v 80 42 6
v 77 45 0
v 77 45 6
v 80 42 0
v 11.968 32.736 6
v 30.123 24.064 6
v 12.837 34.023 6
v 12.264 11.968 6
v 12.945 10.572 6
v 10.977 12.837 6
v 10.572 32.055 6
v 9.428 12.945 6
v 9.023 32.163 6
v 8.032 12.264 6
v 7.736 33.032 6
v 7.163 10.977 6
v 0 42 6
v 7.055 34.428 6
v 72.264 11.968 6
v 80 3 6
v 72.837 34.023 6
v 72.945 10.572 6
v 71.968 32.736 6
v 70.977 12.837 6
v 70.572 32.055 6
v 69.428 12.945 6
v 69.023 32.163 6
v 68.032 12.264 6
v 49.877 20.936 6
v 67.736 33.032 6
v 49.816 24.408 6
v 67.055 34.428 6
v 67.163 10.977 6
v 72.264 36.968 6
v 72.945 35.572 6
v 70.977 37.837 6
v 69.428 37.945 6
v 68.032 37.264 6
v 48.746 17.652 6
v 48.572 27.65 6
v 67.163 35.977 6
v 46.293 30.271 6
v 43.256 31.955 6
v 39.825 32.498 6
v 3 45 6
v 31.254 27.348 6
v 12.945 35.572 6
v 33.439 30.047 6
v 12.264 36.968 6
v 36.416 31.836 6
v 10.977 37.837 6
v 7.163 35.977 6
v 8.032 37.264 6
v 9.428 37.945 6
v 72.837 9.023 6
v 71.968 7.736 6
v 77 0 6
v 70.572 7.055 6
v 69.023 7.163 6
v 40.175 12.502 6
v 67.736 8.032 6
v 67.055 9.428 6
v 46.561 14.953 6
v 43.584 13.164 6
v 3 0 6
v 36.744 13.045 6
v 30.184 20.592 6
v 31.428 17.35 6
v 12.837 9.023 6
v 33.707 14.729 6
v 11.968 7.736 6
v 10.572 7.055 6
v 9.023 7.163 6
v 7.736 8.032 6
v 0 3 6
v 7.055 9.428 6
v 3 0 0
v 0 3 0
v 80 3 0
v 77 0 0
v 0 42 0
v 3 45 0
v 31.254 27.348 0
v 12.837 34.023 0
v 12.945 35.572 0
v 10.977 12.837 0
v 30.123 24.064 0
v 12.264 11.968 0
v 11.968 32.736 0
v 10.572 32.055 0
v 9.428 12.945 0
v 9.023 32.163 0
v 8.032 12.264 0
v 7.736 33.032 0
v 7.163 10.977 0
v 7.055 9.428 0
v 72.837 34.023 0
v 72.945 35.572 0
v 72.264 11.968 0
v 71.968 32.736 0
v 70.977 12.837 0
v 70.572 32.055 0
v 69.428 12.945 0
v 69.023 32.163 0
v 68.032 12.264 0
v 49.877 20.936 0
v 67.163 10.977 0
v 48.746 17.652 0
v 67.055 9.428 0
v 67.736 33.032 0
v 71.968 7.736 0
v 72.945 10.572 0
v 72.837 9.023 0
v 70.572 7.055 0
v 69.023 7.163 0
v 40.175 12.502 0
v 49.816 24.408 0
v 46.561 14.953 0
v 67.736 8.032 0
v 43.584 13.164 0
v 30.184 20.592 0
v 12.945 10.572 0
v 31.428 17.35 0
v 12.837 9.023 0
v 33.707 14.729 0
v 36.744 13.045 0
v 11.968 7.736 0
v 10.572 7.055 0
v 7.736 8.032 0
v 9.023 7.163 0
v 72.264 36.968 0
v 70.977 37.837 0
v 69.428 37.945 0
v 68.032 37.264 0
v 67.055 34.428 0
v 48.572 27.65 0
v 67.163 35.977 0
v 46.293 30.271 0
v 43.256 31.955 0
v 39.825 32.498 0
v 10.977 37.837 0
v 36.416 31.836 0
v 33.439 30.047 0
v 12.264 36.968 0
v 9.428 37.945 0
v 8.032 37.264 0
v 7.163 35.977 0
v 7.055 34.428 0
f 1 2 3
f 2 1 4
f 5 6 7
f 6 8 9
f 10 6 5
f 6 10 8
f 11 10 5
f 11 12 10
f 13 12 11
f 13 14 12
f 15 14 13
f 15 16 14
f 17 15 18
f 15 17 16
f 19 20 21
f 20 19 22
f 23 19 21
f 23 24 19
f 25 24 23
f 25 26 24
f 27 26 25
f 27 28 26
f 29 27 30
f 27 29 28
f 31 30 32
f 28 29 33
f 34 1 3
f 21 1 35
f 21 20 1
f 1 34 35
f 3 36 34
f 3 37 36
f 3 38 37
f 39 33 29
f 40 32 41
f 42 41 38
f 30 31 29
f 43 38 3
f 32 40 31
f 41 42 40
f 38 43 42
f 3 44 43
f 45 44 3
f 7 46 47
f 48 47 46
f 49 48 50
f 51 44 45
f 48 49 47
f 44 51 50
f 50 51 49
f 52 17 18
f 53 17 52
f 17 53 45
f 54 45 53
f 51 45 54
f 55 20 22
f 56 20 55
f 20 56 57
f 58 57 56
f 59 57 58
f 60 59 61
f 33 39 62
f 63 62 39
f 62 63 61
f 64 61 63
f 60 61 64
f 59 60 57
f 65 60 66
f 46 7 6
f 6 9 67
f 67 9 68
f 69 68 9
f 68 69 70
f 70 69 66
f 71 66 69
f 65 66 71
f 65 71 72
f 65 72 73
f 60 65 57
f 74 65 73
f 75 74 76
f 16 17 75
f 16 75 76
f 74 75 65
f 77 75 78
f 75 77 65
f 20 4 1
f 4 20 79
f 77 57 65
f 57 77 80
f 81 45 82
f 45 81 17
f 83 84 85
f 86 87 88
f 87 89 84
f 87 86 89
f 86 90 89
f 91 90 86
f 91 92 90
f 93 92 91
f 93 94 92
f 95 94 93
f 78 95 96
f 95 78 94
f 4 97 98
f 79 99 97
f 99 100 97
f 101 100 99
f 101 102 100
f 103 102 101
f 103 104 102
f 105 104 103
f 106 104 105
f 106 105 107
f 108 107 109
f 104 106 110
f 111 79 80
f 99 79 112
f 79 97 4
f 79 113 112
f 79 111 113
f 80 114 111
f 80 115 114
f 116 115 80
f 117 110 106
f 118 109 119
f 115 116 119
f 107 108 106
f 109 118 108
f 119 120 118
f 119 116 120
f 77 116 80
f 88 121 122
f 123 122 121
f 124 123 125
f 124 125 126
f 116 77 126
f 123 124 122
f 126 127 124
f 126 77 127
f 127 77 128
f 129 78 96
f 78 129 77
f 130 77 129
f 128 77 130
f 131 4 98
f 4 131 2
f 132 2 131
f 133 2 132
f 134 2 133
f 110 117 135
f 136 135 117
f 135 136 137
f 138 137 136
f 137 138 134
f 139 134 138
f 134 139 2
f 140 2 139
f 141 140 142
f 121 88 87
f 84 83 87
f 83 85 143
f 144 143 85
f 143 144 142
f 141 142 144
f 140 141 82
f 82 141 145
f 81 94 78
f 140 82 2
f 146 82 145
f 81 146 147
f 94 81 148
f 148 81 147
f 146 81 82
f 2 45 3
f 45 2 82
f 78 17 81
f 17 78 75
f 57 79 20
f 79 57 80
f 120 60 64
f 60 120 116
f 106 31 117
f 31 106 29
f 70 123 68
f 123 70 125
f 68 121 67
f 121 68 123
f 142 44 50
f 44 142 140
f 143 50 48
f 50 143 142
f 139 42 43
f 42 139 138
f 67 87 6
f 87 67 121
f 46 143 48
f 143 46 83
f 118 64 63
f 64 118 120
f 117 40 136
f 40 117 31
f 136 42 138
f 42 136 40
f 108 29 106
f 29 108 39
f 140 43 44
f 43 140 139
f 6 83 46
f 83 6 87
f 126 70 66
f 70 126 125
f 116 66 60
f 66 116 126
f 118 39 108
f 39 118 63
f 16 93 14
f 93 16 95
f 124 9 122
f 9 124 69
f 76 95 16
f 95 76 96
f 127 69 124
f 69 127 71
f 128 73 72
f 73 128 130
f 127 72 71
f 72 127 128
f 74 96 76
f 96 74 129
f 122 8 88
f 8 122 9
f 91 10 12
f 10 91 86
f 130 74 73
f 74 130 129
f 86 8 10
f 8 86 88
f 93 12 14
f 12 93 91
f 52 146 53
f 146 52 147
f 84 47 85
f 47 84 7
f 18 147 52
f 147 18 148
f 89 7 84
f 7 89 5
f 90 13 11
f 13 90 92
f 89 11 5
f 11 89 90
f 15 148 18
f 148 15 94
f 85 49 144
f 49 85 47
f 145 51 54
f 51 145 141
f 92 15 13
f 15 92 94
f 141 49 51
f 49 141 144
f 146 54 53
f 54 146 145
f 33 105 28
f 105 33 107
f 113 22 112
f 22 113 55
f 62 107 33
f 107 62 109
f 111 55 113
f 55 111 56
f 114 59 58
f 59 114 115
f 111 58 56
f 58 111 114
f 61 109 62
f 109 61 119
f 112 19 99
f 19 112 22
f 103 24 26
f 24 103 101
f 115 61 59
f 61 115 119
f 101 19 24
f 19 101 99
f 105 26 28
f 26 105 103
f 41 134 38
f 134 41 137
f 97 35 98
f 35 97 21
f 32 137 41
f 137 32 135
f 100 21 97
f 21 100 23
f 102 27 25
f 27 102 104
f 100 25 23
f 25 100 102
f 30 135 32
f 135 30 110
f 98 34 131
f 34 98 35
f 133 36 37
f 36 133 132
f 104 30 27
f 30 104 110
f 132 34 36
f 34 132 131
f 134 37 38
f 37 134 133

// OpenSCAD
$fn = 32;

// ----------------------------------------------------------------------
// Spacer plate: rect 80 x 45
// ----------------------------------------------------------------------

// --- parameters (mm) ---
bore_r = 10;              // centre bore radius
bolt_r = 3;               // bolt hole radius
plate_t = 6;              // plate thickness, Z (extrusion height)
plate_l = 80;             // plate length, X
plate_w = 45;             // plate width, Y
inset = 10;               // corner hole inset
fit_tol = 0.05;           // declared fit tolerance (prompt contract)
free_tol = 0.3;           // declared free tolerance (prompt contract)

profile = [[3, 0], [77, 0], [80, 3], [80, 42], [77, 45], [3, 45], [0, 42], [0, 3]];  // primary outline, 8 points, counter clockwise
void_1 = [[49.816, 24.408], [48.572, 27.65], [46.293, 30.271], [43.256, 31.955], [39.825, 32.498], [36.416, 31.836], [33.439, 30.047], [31.254, 27.348], [30.123, 24.064], [30.184, 20.592], [31.428, 17.35], [33.707, 14.729], [36.744, 13.045], [40.175, 12.502], [43.584, 13.164], [46.561, 14.953], [48.746, 17.652], [49.877, 20.936]];  // centre bore, 18 points
void_2 = [[12.945, 10.572], [12.264, 11.968], [10.977, 12.837], [9.428, 12.945], [8.032, 12.264], [7.163, 10.977], [7.055, 9.428], [7.736, 8.032], [9.023, 7.163], [10.572, 7.055], [11.968, 7.736], [12.837, 9.023]];  // corner hole, 12 points
void_3 = [[12.945, 35.572], [12.264, 36.968], [10.977, 37.837], [9.428, 37.945], [8.032, 37.264], [7.163, 35.977], [7.055, 34.428], [7.736, 33.032], [9.023, 32.163], [10.572, 32.055], [11.968, 32.736], [12.837, 34.023]];  // corner hole, 12 points
void_4 = [[72.945, 10.572], [72.264, 11.968], [70.977, 12.837], [69.428, 12.945], [68.032, 12.264], [67.163, 10.977], [67.055, 9.428], [67.736, 8.032], [69.023, 7.163], [70.572, 7.055], [71.968, 7.736], [72.837, 9.023]];  // corner hole, 12 points
void_5 = [[72.945, 35.572], [72.264, 36.968], [70.977, 37.837], [69.428, 37.945], [68.032, 37.264], [67.163, 35.977], [67.055, 34.428], [67.736, 33.032], [69.023, 32.163], [70.572, 32.055], [71.968, 32.736], [72.837, 34.023]];  // corner hole, 12 points

// --- the one profile operation ---
difference() {
  linear_extrude(height = plate_t) polygon(points = profile);
  translate([0, 0, -1])
    linear_extrude(height = plate_t + 2) polygon(points = void_1);
  translate([0, 0, -1])
    linear_extrude(height = plate_t + 2) polygon(points = void_2);
  translate([0, 0, -1])
    linear_extrude(height = plate_t + 2) polygon(points = void_3);
  translate([0, 0, -1])
    linear_extrude(height = plate_t + 2) polygon(points = void_4);
  translate([0, 0, -1])
    linear_extrude(height = plate_t + 2) polygon(points = void_5);
}
